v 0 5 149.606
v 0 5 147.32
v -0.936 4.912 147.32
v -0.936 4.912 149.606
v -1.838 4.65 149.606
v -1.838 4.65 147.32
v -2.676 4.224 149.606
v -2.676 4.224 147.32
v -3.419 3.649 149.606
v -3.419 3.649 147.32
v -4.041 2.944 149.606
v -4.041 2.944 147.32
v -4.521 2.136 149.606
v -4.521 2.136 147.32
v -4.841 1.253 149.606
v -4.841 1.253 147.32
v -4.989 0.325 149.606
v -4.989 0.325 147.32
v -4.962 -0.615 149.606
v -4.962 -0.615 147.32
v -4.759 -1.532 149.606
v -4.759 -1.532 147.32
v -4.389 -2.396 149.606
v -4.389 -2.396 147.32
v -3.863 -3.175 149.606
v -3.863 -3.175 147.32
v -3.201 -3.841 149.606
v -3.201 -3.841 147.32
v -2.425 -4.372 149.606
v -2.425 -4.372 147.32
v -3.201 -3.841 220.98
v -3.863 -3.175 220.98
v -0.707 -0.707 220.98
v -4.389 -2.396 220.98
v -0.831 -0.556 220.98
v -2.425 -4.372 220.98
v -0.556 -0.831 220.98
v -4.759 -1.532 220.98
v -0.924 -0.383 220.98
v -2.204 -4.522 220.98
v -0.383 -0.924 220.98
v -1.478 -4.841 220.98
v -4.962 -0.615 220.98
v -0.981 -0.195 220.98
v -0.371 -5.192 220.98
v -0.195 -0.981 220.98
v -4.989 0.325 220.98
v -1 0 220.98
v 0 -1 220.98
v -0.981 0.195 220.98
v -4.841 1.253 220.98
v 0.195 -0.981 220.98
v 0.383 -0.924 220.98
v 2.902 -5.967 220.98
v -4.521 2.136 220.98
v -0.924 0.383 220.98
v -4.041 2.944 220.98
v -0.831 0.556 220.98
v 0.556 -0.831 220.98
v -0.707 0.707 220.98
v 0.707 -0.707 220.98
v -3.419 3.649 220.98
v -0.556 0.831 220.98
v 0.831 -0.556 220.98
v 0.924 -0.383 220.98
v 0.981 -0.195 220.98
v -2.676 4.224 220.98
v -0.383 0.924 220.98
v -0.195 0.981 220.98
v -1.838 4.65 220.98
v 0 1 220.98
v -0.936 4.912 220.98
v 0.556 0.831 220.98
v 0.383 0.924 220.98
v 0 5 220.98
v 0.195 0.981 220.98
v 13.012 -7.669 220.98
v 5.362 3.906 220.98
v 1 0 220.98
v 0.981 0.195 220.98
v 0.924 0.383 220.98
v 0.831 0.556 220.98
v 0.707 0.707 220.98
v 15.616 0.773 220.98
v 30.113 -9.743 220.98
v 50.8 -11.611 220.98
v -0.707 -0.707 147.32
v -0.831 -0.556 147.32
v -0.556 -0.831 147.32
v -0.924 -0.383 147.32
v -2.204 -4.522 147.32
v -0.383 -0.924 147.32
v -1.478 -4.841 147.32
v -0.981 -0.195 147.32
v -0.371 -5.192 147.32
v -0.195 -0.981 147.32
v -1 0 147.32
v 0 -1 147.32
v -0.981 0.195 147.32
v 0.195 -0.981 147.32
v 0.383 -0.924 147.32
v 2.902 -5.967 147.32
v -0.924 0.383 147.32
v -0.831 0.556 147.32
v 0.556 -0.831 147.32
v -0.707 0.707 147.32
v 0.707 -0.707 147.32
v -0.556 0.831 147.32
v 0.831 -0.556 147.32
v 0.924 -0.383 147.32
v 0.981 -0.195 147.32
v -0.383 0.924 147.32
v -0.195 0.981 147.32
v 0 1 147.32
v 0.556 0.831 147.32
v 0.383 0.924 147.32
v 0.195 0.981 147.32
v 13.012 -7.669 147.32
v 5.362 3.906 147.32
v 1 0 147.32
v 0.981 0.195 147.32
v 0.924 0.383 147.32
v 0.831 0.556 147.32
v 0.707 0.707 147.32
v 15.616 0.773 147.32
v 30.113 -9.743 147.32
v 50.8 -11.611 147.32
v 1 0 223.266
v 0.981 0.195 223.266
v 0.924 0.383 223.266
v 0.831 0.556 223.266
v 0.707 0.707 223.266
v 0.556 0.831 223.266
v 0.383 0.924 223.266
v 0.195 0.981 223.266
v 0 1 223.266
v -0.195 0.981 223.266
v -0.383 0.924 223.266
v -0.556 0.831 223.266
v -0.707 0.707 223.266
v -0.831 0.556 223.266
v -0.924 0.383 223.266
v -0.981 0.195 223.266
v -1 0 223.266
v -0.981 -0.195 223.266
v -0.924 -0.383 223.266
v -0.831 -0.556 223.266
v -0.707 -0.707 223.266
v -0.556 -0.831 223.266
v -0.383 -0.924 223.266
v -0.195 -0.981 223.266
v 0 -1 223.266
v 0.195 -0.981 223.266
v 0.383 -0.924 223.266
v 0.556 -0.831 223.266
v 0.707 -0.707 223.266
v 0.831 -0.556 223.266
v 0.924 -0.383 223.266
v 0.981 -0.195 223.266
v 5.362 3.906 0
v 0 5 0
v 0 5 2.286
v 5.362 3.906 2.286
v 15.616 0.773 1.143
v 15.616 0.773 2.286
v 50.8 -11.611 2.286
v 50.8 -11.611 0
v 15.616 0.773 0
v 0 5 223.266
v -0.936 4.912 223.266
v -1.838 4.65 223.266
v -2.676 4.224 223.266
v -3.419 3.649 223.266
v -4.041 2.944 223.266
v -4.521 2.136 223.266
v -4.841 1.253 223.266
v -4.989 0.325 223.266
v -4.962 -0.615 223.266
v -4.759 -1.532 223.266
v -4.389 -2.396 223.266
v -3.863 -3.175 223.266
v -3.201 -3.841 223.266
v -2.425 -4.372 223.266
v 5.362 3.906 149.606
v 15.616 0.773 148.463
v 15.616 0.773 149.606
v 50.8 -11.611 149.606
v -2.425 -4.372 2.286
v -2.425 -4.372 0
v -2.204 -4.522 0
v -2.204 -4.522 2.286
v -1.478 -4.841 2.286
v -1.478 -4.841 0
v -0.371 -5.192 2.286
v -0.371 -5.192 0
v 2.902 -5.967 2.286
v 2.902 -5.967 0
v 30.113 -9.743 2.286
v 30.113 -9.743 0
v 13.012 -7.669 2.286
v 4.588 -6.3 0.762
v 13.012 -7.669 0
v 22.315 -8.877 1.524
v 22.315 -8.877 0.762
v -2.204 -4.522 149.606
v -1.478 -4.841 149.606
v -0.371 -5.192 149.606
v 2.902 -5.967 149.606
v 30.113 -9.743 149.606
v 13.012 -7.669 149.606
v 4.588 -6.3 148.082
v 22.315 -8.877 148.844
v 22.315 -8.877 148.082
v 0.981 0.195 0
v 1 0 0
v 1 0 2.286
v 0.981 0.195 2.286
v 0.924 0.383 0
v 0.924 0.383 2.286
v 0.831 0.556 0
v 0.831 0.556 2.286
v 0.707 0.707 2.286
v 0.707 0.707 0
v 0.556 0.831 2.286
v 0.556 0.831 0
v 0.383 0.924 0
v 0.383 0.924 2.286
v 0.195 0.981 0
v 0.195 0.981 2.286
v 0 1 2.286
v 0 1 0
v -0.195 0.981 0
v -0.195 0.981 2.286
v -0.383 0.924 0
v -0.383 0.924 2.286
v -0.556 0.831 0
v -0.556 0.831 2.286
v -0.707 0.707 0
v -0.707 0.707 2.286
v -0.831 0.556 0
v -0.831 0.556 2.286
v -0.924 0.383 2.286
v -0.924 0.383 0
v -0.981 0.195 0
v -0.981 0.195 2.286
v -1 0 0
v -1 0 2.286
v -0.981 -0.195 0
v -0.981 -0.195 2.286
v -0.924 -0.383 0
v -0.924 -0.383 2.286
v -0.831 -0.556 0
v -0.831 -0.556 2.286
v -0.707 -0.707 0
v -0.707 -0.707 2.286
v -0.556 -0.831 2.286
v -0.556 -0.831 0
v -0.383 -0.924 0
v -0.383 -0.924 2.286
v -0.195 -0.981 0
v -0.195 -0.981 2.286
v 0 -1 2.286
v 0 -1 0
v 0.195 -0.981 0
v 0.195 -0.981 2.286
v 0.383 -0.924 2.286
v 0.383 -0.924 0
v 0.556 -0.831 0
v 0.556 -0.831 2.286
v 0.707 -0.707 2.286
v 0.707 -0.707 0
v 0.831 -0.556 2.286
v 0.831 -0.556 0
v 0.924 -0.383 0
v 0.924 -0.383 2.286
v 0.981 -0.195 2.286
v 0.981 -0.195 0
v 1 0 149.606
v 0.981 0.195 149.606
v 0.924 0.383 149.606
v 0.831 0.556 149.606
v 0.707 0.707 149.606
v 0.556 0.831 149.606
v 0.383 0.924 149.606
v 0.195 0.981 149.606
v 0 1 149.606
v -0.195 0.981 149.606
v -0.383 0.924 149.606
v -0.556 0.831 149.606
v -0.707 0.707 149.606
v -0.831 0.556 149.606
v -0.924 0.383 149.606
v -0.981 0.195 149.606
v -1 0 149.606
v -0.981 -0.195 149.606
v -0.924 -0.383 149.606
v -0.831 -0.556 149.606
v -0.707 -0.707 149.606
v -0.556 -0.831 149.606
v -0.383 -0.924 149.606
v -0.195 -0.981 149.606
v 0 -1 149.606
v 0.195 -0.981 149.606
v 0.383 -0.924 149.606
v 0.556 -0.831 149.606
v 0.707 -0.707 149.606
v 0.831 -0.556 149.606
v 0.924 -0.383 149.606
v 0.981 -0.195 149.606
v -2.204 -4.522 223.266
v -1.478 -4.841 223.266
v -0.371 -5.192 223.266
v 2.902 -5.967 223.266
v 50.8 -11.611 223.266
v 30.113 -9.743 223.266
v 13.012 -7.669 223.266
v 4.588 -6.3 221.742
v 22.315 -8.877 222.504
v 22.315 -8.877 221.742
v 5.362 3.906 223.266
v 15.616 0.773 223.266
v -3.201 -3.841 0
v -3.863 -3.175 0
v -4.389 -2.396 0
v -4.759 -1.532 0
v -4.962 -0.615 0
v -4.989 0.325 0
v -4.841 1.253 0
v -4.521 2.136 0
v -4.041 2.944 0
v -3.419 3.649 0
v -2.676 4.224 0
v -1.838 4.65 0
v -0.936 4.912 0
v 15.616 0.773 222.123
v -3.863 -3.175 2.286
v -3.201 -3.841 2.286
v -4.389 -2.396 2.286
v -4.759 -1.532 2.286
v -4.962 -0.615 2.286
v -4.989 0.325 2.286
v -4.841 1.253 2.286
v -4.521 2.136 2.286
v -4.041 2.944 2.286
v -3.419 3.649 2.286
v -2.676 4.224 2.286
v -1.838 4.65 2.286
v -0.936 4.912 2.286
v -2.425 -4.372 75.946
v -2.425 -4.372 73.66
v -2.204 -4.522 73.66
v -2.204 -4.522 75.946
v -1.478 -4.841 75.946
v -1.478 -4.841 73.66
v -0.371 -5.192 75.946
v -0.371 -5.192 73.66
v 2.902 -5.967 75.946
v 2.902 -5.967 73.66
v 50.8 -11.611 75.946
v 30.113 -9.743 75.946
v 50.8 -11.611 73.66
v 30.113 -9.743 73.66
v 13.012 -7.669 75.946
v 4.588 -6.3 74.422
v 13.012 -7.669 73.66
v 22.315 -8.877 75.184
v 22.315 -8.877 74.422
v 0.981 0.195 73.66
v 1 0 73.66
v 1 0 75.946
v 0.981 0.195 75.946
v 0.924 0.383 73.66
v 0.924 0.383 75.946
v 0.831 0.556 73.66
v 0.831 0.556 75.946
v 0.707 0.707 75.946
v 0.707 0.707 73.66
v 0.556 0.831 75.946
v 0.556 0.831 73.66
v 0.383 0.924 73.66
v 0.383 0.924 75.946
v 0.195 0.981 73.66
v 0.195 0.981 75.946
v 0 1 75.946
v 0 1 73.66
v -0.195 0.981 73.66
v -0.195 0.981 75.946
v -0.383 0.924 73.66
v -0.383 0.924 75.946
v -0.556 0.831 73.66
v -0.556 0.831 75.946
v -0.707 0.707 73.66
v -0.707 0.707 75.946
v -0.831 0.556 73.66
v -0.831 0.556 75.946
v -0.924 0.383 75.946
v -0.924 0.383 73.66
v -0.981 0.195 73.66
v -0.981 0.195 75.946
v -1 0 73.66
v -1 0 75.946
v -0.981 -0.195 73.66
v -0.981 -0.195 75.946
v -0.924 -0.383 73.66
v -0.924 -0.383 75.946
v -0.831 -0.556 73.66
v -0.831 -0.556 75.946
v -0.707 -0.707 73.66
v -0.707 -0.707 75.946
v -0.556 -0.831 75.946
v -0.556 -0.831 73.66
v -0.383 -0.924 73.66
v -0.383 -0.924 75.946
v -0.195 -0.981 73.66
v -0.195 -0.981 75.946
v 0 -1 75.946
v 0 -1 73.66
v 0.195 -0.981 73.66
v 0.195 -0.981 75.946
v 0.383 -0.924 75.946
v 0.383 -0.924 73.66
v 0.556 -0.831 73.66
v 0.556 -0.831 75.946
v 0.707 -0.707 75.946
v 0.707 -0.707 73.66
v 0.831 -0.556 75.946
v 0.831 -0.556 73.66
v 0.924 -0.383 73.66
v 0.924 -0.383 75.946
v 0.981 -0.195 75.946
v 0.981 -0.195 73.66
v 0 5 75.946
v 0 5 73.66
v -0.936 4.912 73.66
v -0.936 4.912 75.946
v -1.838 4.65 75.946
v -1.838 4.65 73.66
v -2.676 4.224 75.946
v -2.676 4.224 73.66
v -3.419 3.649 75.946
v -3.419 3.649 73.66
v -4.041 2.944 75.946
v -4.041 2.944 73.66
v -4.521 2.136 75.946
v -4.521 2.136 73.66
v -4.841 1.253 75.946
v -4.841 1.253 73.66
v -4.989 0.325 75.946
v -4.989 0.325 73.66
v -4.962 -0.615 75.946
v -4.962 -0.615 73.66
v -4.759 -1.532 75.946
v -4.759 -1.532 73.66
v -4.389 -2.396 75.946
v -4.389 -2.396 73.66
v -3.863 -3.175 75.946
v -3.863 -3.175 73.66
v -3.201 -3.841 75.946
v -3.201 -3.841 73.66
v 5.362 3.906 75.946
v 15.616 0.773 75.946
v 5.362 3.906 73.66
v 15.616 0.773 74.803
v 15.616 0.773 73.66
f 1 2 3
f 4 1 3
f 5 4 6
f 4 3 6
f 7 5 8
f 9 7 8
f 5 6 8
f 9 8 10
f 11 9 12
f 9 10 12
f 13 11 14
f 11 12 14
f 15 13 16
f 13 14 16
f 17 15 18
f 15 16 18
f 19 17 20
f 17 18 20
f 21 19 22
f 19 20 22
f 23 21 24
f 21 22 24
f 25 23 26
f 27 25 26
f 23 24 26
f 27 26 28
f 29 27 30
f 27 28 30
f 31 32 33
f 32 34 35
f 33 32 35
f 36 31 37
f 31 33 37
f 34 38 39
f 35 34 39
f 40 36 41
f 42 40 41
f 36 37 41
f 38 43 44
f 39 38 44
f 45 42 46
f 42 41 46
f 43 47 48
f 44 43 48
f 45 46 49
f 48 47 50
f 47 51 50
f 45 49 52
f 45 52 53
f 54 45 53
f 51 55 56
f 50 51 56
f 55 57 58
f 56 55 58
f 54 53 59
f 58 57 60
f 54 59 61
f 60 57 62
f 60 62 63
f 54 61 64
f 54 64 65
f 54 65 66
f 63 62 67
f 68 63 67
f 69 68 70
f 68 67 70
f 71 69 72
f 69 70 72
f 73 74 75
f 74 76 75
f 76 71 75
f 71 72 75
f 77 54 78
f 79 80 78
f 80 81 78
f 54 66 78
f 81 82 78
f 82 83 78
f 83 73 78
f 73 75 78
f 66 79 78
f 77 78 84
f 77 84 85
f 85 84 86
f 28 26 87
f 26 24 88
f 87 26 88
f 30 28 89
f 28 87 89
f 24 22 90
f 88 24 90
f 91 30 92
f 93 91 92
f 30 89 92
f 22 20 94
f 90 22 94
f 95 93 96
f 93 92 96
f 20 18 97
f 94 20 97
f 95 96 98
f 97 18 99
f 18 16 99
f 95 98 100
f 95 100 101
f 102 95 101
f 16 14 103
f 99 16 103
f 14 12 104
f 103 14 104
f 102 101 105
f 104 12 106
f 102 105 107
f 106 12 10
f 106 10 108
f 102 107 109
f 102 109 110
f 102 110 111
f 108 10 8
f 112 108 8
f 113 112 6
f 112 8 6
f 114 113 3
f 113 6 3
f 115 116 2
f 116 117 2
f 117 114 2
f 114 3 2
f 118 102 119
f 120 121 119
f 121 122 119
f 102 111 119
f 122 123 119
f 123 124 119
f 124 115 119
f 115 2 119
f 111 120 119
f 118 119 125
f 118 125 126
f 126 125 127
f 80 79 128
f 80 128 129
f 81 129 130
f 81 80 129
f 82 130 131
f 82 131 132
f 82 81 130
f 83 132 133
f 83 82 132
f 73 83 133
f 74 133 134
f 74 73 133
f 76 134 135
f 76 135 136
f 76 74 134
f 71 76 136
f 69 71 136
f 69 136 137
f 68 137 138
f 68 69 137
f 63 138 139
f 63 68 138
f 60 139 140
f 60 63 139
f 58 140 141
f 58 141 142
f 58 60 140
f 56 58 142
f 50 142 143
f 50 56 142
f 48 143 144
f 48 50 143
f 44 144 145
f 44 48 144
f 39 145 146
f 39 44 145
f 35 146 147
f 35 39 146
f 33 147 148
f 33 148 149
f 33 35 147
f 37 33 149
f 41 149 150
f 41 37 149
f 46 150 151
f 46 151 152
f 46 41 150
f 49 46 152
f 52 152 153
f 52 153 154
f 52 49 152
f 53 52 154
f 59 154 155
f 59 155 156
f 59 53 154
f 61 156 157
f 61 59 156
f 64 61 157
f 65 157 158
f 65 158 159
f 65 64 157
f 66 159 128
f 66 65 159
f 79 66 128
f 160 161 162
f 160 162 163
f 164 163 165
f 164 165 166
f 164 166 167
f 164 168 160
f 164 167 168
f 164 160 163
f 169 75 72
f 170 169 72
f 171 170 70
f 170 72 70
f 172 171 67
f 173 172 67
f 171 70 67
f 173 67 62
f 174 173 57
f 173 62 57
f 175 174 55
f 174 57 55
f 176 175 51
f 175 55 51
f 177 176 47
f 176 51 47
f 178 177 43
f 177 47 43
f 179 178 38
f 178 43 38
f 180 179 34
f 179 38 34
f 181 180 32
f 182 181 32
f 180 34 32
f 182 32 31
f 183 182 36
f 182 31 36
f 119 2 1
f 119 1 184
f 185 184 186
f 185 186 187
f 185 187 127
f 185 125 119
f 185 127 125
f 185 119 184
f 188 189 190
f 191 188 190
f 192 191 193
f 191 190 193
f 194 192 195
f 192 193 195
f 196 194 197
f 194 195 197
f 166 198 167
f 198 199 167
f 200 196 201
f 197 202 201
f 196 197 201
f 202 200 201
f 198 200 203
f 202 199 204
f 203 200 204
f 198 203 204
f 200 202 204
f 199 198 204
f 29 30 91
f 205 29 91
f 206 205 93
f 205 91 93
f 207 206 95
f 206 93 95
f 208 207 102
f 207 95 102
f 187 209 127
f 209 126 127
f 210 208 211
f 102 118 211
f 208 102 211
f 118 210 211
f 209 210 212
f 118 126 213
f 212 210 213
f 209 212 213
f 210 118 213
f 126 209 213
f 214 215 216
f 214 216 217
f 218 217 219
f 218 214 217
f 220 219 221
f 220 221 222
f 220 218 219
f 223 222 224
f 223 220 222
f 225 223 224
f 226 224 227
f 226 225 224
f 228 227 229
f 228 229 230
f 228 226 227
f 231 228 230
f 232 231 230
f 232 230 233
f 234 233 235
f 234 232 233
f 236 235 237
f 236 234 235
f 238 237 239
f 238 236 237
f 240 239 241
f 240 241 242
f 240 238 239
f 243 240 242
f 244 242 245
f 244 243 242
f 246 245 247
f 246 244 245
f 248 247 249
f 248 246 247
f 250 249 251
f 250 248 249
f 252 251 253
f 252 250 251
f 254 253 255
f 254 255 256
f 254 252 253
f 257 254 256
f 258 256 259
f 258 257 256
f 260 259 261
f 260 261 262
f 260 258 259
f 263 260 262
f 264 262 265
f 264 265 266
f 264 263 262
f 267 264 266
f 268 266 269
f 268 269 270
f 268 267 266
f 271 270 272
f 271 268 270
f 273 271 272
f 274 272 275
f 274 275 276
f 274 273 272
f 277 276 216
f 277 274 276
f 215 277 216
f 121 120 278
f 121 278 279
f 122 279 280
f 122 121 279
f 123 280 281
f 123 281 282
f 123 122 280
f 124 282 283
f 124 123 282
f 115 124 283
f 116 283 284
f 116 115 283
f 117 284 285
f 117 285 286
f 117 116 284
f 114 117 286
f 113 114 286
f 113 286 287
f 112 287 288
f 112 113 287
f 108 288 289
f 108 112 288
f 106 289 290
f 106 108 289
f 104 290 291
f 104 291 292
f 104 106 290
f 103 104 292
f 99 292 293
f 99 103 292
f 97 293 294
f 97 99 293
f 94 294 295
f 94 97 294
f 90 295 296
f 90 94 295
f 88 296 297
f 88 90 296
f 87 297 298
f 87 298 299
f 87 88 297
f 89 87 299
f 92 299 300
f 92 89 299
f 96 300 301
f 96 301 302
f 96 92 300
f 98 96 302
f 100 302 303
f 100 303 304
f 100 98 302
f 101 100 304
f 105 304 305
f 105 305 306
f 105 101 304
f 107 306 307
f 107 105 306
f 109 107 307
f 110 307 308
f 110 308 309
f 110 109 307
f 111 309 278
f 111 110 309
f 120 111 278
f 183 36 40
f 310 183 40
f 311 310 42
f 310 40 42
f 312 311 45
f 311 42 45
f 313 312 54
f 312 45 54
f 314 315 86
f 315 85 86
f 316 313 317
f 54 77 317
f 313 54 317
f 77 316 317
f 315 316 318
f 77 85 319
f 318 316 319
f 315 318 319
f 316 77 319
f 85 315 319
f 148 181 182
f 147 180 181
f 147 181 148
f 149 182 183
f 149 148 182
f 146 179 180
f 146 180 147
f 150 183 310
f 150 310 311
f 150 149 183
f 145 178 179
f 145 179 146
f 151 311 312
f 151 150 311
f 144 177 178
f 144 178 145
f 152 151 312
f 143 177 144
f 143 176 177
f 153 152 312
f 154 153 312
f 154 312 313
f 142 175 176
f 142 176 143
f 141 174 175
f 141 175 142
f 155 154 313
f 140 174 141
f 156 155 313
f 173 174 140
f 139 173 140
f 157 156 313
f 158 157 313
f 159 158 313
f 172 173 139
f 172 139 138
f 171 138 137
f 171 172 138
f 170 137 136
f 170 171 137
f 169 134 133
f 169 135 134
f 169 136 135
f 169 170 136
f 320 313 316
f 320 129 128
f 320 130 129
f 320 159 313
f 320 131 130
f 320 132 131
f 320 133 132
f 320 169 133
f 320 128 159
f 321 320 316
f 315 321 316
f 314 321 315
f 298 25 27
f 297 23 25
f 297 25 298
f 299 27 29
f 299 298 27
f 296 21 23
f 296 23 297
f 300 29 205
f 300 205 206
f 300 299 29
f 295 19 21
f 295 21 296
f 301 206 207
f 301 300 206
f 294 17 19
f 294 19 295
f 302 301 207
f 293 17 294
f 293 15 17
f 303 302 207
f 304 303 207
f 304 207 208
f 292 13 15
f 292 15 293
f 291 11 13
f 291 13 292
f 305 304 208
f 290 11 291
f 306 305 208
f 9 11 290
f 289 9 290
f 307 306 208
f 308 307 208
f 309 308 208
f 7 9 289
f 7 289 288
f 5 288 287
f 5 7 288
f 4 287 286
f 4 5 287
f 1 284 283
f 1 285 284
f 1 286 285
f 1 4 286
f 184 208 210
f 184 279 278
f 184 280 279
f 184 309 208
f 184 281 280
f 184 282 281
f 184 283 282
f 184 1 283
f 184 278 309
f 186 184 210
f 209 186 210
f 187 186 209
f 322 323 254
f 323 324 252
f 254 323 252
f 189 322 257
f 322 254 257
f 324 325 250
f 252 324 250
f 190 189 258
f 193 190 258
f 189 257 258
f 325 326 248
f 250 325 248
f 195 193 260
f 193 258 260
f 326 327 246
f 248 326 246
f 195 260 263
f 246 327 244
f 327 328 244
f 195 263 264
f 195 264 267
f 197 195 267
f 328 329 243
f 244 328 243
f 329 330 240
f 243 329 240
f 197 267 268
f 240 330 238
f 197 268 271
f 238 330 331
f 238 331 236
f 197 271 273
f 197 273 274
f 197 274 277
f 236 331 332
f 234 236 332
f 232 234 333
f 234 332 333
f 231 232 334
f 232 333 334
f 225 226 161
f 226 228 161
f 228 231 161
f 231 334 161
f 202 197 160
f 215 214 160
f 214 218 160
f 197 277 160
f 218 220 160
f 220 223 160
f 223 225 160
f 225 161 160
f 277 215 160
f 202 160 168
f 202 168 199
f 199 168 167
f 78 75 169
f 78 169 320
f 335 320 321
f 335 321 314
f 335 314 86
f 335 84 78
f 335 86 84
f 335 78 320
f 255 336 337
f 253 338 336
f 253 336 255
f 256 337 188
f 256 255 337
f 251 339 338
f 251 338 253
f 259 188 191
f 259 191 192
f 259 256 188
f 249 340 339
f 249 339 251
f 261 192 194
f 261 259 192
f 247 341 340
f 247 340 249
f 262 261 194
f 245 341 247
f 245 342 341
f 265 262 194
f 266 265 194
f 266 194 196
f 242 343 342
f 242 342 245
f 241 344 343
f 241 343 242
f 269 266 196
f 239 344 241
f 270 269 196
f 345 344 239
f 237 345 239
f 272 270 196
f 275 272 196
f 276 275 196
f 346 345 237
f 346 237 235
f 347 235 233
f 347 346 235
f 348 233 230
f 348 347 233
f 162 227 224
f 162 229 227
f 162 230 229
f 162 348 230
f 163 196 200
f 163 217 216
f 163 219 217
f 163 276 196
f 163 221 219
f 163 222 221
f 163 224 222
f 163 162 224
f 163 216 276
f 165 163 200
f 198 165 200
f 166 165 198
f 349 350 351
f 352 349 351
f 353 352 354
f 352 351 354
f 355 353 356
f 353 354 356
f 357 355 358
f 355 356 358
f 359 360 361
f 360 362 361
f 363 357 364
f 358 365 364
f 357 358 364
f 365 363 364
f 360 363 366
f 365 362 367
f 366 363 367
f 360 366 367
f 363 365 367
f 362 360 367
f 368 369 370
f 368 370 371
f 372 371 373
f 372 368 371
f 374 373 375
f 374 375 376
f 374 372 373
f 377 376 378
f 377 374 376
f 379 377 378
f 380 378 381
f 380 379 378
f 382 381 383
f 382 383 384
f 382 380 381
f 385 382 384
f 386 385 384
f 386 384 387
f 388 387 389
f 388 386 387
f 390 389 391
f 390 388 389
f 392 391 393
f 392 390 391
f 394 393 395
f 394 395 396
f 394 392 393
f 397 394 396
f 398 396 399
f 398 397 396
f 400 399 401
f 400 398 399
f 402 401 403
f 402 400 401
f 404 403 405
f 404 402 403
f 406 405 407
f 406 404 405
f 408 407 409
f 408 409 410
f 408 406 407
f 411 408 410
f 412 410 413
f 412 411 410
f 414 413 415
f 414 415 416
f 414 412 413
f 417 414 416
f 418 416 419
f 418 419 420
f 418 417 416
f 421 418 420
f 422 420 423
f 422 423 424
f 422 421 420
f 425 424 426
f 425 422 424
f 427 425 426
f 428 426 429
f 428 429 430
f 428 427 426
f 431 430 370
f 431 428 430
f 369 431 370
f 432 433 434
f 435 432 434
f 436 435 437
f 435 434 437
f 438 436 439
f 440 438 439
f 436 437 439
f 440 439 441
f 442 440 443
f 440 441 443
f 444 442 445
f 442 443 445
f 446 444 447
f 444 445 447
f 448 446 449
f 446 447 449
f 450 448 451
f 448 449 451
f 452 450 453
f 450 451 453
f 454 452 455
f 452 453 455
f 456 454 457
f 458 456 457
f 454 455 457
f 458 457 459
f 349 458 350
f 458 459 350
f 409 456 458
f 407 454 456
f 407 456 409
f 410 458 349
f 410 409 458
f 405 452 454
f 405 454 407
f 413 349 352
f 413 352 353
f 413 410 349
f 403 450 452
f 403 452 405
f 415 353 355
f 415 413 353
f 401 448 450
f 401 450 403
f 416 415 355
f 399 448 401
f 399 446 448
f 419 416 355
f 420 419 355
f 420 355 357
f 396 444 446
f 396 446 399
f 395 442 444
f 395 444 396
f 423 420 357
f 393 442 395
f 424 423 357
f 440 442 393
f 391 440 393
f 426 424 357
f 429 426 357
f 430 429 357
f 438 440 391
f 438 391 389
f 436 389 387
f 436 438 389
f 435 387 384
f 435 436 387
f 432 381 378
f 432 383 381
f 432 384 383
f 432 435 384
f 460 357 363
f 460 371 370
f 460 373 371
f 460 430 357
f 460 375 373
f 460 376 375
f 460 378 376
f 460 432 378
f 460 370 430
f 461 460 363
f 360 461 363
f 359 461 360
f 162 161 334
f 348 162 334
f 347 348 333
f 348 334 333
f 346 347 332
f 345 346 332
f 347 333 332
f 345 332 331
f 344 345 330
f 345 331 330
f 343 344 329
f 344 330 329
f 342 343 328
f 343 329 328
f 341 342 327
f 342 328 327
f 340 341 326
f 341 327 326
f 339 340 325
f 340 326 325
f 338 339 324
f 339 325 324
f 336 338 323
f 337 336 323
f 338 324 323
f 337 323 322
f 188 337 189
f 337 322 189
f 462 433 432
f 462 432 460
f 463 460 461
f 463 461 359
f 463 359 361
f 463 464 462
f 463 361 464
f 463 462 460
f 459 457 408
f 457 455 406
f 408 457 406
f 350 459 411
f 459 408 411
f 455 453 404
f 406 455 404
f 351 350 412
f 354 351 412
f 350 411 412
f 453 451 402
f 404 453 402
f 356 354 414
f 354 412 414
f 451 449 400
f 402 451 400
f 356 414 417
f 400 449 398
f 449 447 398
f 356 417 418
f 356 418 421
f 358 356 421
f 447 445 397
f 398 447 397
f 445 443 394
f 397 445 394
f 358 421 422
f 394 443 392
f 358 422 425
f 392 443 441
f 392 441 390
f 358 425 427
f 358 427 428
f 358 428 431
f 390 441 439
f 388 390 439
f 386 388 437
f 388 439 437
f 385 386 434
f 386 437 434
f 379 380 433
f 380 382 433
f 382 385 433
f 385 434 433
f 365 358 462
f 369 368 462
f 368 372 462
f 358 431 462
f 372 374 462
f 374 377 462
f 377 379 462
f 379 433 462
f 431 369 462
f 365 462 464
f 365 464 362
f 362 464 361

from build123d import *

# Parameters (mm, degrees)
SKETCH2_R           = 1
BOSS_EXTRUDE4_DEPTH = 2.286
SKETCH9_R           = 1
BOSS_EXTRUDE5_DEPTH = 2.286
SKETCH10_R          = 1
BOSS_EXTRUDE6_DEPTH = 2.286
SKETCH13_R          = 1
BOSS_EXTRUDE7_DEPTH = 2.286


with BuildPart() as part:
    # Sketch2 → Boss-Extrude4 (new body)
    with BuildSketch(Plane.XY):
        with BuildLine():
            ThreePointArc((0, 5), (-4.840543404, 1.252653008), (-2.425408502, -4.372344177))
            add(Edge.make_bspline(
                [(-2.425408502, -4.372344177), (-0.75384545, -5.811128073), (16.922119164, -8.962359502), (50.8, -11.610741386)],
                knots=[0, 0, 0, 0, 1, 1, 1, 1], degree=3))
            add(Edge.make_bspline(
                [(0, 5), (5.832463916, 4.850394407), (50.8, -11.610741386)],
                knots=[0, 0, 0, 1, 1, 1], degree=2))
        make_face()
        Circle(SKETCH2_R, mode=Mode.SUBTRACT)
    extrude(amount=BOSS_EXTRUDE4_DEPTH)


with BuildPart() as body_2:
    # Sketch9 → Boss-Extrude5 (new body)
    with BuildSketch(Plane.XY.offset(73.66)):
        with BuildLine():
            ThreePointArc((0, 5), (-4.840543404, 1.252653008), (-2.425408502, -4.372344177))
            add(Edge.make_bspline(
                [(-2.425408502, -4.372344177), (-0.75384545, -5.811128073), (16.922119164, -8.962359502), (50.8, -11.610741386)],
                knots=[0, 0, 0, 0, 1, 1, 1, 1], degree=3))
            add(Edge.make_bspline(
                [(0, 5), (5.832463916, 4.850394407), (50.8, -11.610741386)],
                knots=[0, 0, 0, 1, 1, 1], degree=2))
        make_face()
        Circle(SKETCH9_R, mode=Mode.SUBTRACT)
    extrude(amount=BOSS_EXTRUDE5_DEPTH)


with BuildPart() as body_3:
    # Sketch10 → Boss-Extrude6 (new body)
    with BuildSketch(Plane.XY.offset(147.32)):
        with BuildLine():
            ThreePointArc((0, 5), (-4.840543404, 1.252653008), (-2.425408502, -4.372344177))
            add(Edge.make_bspline(
                [(-2.425408502, -4.372344177), (-0.75384545, -5.811128073), (16.922119164, -8.962359502), (50.8, -11.610741386)],
                knots=[0, 0, 0, 0, 1, 1, 1, 1], degree=3))
            add(Edge.make_bspline(
                [(0, 5), (5.832463916, 4.850394407), (50.8, -11.610741386)],
                knots=[0, 0, 0, 1, 1, 1], degree=2))
        make_face()
        Circle(SKETCH10_R, mode=Mode.SUBTRACT)
    extrude(amount=BOSS_EXTRUDE6_DEPTH)


with BuildPart() as body_4:
    # Sketch13 → Boss-Extrude7 (new body)
    with BuildSketch(Plane.XY.offset(220.98)):
        with BuildLine():
            ThreePointArc((0, 5), (-4.840543404, 1.252653008), (-2.425408502, -4.372344177))
            add(Edge.make_bspline(
                [(-2.425408502, -4.372344177), (-0.75384545, -5.811128073), (16.922119164, -8.962359502), (50.8, -11.610741386)],
                knots=[0, 0, 0, 0, 1, 1, 1, 1], degree=3))
            add(Edge.make_bspline(
                [(0, 5), (5.832463916, 4.850394407), (50.8, -11.610741386)],
                knots=[0, 0, 0, 1, 1, 1], degree=2))
        make_face()
        Circle(SKETCH13_R, mode=Mode.SUBTRACT)
    extrude(amount=BOSS_EXTRUDE7_DEPTH)


solid = Compound([part.part, body_2.part, body_3.part, body_4.part])
